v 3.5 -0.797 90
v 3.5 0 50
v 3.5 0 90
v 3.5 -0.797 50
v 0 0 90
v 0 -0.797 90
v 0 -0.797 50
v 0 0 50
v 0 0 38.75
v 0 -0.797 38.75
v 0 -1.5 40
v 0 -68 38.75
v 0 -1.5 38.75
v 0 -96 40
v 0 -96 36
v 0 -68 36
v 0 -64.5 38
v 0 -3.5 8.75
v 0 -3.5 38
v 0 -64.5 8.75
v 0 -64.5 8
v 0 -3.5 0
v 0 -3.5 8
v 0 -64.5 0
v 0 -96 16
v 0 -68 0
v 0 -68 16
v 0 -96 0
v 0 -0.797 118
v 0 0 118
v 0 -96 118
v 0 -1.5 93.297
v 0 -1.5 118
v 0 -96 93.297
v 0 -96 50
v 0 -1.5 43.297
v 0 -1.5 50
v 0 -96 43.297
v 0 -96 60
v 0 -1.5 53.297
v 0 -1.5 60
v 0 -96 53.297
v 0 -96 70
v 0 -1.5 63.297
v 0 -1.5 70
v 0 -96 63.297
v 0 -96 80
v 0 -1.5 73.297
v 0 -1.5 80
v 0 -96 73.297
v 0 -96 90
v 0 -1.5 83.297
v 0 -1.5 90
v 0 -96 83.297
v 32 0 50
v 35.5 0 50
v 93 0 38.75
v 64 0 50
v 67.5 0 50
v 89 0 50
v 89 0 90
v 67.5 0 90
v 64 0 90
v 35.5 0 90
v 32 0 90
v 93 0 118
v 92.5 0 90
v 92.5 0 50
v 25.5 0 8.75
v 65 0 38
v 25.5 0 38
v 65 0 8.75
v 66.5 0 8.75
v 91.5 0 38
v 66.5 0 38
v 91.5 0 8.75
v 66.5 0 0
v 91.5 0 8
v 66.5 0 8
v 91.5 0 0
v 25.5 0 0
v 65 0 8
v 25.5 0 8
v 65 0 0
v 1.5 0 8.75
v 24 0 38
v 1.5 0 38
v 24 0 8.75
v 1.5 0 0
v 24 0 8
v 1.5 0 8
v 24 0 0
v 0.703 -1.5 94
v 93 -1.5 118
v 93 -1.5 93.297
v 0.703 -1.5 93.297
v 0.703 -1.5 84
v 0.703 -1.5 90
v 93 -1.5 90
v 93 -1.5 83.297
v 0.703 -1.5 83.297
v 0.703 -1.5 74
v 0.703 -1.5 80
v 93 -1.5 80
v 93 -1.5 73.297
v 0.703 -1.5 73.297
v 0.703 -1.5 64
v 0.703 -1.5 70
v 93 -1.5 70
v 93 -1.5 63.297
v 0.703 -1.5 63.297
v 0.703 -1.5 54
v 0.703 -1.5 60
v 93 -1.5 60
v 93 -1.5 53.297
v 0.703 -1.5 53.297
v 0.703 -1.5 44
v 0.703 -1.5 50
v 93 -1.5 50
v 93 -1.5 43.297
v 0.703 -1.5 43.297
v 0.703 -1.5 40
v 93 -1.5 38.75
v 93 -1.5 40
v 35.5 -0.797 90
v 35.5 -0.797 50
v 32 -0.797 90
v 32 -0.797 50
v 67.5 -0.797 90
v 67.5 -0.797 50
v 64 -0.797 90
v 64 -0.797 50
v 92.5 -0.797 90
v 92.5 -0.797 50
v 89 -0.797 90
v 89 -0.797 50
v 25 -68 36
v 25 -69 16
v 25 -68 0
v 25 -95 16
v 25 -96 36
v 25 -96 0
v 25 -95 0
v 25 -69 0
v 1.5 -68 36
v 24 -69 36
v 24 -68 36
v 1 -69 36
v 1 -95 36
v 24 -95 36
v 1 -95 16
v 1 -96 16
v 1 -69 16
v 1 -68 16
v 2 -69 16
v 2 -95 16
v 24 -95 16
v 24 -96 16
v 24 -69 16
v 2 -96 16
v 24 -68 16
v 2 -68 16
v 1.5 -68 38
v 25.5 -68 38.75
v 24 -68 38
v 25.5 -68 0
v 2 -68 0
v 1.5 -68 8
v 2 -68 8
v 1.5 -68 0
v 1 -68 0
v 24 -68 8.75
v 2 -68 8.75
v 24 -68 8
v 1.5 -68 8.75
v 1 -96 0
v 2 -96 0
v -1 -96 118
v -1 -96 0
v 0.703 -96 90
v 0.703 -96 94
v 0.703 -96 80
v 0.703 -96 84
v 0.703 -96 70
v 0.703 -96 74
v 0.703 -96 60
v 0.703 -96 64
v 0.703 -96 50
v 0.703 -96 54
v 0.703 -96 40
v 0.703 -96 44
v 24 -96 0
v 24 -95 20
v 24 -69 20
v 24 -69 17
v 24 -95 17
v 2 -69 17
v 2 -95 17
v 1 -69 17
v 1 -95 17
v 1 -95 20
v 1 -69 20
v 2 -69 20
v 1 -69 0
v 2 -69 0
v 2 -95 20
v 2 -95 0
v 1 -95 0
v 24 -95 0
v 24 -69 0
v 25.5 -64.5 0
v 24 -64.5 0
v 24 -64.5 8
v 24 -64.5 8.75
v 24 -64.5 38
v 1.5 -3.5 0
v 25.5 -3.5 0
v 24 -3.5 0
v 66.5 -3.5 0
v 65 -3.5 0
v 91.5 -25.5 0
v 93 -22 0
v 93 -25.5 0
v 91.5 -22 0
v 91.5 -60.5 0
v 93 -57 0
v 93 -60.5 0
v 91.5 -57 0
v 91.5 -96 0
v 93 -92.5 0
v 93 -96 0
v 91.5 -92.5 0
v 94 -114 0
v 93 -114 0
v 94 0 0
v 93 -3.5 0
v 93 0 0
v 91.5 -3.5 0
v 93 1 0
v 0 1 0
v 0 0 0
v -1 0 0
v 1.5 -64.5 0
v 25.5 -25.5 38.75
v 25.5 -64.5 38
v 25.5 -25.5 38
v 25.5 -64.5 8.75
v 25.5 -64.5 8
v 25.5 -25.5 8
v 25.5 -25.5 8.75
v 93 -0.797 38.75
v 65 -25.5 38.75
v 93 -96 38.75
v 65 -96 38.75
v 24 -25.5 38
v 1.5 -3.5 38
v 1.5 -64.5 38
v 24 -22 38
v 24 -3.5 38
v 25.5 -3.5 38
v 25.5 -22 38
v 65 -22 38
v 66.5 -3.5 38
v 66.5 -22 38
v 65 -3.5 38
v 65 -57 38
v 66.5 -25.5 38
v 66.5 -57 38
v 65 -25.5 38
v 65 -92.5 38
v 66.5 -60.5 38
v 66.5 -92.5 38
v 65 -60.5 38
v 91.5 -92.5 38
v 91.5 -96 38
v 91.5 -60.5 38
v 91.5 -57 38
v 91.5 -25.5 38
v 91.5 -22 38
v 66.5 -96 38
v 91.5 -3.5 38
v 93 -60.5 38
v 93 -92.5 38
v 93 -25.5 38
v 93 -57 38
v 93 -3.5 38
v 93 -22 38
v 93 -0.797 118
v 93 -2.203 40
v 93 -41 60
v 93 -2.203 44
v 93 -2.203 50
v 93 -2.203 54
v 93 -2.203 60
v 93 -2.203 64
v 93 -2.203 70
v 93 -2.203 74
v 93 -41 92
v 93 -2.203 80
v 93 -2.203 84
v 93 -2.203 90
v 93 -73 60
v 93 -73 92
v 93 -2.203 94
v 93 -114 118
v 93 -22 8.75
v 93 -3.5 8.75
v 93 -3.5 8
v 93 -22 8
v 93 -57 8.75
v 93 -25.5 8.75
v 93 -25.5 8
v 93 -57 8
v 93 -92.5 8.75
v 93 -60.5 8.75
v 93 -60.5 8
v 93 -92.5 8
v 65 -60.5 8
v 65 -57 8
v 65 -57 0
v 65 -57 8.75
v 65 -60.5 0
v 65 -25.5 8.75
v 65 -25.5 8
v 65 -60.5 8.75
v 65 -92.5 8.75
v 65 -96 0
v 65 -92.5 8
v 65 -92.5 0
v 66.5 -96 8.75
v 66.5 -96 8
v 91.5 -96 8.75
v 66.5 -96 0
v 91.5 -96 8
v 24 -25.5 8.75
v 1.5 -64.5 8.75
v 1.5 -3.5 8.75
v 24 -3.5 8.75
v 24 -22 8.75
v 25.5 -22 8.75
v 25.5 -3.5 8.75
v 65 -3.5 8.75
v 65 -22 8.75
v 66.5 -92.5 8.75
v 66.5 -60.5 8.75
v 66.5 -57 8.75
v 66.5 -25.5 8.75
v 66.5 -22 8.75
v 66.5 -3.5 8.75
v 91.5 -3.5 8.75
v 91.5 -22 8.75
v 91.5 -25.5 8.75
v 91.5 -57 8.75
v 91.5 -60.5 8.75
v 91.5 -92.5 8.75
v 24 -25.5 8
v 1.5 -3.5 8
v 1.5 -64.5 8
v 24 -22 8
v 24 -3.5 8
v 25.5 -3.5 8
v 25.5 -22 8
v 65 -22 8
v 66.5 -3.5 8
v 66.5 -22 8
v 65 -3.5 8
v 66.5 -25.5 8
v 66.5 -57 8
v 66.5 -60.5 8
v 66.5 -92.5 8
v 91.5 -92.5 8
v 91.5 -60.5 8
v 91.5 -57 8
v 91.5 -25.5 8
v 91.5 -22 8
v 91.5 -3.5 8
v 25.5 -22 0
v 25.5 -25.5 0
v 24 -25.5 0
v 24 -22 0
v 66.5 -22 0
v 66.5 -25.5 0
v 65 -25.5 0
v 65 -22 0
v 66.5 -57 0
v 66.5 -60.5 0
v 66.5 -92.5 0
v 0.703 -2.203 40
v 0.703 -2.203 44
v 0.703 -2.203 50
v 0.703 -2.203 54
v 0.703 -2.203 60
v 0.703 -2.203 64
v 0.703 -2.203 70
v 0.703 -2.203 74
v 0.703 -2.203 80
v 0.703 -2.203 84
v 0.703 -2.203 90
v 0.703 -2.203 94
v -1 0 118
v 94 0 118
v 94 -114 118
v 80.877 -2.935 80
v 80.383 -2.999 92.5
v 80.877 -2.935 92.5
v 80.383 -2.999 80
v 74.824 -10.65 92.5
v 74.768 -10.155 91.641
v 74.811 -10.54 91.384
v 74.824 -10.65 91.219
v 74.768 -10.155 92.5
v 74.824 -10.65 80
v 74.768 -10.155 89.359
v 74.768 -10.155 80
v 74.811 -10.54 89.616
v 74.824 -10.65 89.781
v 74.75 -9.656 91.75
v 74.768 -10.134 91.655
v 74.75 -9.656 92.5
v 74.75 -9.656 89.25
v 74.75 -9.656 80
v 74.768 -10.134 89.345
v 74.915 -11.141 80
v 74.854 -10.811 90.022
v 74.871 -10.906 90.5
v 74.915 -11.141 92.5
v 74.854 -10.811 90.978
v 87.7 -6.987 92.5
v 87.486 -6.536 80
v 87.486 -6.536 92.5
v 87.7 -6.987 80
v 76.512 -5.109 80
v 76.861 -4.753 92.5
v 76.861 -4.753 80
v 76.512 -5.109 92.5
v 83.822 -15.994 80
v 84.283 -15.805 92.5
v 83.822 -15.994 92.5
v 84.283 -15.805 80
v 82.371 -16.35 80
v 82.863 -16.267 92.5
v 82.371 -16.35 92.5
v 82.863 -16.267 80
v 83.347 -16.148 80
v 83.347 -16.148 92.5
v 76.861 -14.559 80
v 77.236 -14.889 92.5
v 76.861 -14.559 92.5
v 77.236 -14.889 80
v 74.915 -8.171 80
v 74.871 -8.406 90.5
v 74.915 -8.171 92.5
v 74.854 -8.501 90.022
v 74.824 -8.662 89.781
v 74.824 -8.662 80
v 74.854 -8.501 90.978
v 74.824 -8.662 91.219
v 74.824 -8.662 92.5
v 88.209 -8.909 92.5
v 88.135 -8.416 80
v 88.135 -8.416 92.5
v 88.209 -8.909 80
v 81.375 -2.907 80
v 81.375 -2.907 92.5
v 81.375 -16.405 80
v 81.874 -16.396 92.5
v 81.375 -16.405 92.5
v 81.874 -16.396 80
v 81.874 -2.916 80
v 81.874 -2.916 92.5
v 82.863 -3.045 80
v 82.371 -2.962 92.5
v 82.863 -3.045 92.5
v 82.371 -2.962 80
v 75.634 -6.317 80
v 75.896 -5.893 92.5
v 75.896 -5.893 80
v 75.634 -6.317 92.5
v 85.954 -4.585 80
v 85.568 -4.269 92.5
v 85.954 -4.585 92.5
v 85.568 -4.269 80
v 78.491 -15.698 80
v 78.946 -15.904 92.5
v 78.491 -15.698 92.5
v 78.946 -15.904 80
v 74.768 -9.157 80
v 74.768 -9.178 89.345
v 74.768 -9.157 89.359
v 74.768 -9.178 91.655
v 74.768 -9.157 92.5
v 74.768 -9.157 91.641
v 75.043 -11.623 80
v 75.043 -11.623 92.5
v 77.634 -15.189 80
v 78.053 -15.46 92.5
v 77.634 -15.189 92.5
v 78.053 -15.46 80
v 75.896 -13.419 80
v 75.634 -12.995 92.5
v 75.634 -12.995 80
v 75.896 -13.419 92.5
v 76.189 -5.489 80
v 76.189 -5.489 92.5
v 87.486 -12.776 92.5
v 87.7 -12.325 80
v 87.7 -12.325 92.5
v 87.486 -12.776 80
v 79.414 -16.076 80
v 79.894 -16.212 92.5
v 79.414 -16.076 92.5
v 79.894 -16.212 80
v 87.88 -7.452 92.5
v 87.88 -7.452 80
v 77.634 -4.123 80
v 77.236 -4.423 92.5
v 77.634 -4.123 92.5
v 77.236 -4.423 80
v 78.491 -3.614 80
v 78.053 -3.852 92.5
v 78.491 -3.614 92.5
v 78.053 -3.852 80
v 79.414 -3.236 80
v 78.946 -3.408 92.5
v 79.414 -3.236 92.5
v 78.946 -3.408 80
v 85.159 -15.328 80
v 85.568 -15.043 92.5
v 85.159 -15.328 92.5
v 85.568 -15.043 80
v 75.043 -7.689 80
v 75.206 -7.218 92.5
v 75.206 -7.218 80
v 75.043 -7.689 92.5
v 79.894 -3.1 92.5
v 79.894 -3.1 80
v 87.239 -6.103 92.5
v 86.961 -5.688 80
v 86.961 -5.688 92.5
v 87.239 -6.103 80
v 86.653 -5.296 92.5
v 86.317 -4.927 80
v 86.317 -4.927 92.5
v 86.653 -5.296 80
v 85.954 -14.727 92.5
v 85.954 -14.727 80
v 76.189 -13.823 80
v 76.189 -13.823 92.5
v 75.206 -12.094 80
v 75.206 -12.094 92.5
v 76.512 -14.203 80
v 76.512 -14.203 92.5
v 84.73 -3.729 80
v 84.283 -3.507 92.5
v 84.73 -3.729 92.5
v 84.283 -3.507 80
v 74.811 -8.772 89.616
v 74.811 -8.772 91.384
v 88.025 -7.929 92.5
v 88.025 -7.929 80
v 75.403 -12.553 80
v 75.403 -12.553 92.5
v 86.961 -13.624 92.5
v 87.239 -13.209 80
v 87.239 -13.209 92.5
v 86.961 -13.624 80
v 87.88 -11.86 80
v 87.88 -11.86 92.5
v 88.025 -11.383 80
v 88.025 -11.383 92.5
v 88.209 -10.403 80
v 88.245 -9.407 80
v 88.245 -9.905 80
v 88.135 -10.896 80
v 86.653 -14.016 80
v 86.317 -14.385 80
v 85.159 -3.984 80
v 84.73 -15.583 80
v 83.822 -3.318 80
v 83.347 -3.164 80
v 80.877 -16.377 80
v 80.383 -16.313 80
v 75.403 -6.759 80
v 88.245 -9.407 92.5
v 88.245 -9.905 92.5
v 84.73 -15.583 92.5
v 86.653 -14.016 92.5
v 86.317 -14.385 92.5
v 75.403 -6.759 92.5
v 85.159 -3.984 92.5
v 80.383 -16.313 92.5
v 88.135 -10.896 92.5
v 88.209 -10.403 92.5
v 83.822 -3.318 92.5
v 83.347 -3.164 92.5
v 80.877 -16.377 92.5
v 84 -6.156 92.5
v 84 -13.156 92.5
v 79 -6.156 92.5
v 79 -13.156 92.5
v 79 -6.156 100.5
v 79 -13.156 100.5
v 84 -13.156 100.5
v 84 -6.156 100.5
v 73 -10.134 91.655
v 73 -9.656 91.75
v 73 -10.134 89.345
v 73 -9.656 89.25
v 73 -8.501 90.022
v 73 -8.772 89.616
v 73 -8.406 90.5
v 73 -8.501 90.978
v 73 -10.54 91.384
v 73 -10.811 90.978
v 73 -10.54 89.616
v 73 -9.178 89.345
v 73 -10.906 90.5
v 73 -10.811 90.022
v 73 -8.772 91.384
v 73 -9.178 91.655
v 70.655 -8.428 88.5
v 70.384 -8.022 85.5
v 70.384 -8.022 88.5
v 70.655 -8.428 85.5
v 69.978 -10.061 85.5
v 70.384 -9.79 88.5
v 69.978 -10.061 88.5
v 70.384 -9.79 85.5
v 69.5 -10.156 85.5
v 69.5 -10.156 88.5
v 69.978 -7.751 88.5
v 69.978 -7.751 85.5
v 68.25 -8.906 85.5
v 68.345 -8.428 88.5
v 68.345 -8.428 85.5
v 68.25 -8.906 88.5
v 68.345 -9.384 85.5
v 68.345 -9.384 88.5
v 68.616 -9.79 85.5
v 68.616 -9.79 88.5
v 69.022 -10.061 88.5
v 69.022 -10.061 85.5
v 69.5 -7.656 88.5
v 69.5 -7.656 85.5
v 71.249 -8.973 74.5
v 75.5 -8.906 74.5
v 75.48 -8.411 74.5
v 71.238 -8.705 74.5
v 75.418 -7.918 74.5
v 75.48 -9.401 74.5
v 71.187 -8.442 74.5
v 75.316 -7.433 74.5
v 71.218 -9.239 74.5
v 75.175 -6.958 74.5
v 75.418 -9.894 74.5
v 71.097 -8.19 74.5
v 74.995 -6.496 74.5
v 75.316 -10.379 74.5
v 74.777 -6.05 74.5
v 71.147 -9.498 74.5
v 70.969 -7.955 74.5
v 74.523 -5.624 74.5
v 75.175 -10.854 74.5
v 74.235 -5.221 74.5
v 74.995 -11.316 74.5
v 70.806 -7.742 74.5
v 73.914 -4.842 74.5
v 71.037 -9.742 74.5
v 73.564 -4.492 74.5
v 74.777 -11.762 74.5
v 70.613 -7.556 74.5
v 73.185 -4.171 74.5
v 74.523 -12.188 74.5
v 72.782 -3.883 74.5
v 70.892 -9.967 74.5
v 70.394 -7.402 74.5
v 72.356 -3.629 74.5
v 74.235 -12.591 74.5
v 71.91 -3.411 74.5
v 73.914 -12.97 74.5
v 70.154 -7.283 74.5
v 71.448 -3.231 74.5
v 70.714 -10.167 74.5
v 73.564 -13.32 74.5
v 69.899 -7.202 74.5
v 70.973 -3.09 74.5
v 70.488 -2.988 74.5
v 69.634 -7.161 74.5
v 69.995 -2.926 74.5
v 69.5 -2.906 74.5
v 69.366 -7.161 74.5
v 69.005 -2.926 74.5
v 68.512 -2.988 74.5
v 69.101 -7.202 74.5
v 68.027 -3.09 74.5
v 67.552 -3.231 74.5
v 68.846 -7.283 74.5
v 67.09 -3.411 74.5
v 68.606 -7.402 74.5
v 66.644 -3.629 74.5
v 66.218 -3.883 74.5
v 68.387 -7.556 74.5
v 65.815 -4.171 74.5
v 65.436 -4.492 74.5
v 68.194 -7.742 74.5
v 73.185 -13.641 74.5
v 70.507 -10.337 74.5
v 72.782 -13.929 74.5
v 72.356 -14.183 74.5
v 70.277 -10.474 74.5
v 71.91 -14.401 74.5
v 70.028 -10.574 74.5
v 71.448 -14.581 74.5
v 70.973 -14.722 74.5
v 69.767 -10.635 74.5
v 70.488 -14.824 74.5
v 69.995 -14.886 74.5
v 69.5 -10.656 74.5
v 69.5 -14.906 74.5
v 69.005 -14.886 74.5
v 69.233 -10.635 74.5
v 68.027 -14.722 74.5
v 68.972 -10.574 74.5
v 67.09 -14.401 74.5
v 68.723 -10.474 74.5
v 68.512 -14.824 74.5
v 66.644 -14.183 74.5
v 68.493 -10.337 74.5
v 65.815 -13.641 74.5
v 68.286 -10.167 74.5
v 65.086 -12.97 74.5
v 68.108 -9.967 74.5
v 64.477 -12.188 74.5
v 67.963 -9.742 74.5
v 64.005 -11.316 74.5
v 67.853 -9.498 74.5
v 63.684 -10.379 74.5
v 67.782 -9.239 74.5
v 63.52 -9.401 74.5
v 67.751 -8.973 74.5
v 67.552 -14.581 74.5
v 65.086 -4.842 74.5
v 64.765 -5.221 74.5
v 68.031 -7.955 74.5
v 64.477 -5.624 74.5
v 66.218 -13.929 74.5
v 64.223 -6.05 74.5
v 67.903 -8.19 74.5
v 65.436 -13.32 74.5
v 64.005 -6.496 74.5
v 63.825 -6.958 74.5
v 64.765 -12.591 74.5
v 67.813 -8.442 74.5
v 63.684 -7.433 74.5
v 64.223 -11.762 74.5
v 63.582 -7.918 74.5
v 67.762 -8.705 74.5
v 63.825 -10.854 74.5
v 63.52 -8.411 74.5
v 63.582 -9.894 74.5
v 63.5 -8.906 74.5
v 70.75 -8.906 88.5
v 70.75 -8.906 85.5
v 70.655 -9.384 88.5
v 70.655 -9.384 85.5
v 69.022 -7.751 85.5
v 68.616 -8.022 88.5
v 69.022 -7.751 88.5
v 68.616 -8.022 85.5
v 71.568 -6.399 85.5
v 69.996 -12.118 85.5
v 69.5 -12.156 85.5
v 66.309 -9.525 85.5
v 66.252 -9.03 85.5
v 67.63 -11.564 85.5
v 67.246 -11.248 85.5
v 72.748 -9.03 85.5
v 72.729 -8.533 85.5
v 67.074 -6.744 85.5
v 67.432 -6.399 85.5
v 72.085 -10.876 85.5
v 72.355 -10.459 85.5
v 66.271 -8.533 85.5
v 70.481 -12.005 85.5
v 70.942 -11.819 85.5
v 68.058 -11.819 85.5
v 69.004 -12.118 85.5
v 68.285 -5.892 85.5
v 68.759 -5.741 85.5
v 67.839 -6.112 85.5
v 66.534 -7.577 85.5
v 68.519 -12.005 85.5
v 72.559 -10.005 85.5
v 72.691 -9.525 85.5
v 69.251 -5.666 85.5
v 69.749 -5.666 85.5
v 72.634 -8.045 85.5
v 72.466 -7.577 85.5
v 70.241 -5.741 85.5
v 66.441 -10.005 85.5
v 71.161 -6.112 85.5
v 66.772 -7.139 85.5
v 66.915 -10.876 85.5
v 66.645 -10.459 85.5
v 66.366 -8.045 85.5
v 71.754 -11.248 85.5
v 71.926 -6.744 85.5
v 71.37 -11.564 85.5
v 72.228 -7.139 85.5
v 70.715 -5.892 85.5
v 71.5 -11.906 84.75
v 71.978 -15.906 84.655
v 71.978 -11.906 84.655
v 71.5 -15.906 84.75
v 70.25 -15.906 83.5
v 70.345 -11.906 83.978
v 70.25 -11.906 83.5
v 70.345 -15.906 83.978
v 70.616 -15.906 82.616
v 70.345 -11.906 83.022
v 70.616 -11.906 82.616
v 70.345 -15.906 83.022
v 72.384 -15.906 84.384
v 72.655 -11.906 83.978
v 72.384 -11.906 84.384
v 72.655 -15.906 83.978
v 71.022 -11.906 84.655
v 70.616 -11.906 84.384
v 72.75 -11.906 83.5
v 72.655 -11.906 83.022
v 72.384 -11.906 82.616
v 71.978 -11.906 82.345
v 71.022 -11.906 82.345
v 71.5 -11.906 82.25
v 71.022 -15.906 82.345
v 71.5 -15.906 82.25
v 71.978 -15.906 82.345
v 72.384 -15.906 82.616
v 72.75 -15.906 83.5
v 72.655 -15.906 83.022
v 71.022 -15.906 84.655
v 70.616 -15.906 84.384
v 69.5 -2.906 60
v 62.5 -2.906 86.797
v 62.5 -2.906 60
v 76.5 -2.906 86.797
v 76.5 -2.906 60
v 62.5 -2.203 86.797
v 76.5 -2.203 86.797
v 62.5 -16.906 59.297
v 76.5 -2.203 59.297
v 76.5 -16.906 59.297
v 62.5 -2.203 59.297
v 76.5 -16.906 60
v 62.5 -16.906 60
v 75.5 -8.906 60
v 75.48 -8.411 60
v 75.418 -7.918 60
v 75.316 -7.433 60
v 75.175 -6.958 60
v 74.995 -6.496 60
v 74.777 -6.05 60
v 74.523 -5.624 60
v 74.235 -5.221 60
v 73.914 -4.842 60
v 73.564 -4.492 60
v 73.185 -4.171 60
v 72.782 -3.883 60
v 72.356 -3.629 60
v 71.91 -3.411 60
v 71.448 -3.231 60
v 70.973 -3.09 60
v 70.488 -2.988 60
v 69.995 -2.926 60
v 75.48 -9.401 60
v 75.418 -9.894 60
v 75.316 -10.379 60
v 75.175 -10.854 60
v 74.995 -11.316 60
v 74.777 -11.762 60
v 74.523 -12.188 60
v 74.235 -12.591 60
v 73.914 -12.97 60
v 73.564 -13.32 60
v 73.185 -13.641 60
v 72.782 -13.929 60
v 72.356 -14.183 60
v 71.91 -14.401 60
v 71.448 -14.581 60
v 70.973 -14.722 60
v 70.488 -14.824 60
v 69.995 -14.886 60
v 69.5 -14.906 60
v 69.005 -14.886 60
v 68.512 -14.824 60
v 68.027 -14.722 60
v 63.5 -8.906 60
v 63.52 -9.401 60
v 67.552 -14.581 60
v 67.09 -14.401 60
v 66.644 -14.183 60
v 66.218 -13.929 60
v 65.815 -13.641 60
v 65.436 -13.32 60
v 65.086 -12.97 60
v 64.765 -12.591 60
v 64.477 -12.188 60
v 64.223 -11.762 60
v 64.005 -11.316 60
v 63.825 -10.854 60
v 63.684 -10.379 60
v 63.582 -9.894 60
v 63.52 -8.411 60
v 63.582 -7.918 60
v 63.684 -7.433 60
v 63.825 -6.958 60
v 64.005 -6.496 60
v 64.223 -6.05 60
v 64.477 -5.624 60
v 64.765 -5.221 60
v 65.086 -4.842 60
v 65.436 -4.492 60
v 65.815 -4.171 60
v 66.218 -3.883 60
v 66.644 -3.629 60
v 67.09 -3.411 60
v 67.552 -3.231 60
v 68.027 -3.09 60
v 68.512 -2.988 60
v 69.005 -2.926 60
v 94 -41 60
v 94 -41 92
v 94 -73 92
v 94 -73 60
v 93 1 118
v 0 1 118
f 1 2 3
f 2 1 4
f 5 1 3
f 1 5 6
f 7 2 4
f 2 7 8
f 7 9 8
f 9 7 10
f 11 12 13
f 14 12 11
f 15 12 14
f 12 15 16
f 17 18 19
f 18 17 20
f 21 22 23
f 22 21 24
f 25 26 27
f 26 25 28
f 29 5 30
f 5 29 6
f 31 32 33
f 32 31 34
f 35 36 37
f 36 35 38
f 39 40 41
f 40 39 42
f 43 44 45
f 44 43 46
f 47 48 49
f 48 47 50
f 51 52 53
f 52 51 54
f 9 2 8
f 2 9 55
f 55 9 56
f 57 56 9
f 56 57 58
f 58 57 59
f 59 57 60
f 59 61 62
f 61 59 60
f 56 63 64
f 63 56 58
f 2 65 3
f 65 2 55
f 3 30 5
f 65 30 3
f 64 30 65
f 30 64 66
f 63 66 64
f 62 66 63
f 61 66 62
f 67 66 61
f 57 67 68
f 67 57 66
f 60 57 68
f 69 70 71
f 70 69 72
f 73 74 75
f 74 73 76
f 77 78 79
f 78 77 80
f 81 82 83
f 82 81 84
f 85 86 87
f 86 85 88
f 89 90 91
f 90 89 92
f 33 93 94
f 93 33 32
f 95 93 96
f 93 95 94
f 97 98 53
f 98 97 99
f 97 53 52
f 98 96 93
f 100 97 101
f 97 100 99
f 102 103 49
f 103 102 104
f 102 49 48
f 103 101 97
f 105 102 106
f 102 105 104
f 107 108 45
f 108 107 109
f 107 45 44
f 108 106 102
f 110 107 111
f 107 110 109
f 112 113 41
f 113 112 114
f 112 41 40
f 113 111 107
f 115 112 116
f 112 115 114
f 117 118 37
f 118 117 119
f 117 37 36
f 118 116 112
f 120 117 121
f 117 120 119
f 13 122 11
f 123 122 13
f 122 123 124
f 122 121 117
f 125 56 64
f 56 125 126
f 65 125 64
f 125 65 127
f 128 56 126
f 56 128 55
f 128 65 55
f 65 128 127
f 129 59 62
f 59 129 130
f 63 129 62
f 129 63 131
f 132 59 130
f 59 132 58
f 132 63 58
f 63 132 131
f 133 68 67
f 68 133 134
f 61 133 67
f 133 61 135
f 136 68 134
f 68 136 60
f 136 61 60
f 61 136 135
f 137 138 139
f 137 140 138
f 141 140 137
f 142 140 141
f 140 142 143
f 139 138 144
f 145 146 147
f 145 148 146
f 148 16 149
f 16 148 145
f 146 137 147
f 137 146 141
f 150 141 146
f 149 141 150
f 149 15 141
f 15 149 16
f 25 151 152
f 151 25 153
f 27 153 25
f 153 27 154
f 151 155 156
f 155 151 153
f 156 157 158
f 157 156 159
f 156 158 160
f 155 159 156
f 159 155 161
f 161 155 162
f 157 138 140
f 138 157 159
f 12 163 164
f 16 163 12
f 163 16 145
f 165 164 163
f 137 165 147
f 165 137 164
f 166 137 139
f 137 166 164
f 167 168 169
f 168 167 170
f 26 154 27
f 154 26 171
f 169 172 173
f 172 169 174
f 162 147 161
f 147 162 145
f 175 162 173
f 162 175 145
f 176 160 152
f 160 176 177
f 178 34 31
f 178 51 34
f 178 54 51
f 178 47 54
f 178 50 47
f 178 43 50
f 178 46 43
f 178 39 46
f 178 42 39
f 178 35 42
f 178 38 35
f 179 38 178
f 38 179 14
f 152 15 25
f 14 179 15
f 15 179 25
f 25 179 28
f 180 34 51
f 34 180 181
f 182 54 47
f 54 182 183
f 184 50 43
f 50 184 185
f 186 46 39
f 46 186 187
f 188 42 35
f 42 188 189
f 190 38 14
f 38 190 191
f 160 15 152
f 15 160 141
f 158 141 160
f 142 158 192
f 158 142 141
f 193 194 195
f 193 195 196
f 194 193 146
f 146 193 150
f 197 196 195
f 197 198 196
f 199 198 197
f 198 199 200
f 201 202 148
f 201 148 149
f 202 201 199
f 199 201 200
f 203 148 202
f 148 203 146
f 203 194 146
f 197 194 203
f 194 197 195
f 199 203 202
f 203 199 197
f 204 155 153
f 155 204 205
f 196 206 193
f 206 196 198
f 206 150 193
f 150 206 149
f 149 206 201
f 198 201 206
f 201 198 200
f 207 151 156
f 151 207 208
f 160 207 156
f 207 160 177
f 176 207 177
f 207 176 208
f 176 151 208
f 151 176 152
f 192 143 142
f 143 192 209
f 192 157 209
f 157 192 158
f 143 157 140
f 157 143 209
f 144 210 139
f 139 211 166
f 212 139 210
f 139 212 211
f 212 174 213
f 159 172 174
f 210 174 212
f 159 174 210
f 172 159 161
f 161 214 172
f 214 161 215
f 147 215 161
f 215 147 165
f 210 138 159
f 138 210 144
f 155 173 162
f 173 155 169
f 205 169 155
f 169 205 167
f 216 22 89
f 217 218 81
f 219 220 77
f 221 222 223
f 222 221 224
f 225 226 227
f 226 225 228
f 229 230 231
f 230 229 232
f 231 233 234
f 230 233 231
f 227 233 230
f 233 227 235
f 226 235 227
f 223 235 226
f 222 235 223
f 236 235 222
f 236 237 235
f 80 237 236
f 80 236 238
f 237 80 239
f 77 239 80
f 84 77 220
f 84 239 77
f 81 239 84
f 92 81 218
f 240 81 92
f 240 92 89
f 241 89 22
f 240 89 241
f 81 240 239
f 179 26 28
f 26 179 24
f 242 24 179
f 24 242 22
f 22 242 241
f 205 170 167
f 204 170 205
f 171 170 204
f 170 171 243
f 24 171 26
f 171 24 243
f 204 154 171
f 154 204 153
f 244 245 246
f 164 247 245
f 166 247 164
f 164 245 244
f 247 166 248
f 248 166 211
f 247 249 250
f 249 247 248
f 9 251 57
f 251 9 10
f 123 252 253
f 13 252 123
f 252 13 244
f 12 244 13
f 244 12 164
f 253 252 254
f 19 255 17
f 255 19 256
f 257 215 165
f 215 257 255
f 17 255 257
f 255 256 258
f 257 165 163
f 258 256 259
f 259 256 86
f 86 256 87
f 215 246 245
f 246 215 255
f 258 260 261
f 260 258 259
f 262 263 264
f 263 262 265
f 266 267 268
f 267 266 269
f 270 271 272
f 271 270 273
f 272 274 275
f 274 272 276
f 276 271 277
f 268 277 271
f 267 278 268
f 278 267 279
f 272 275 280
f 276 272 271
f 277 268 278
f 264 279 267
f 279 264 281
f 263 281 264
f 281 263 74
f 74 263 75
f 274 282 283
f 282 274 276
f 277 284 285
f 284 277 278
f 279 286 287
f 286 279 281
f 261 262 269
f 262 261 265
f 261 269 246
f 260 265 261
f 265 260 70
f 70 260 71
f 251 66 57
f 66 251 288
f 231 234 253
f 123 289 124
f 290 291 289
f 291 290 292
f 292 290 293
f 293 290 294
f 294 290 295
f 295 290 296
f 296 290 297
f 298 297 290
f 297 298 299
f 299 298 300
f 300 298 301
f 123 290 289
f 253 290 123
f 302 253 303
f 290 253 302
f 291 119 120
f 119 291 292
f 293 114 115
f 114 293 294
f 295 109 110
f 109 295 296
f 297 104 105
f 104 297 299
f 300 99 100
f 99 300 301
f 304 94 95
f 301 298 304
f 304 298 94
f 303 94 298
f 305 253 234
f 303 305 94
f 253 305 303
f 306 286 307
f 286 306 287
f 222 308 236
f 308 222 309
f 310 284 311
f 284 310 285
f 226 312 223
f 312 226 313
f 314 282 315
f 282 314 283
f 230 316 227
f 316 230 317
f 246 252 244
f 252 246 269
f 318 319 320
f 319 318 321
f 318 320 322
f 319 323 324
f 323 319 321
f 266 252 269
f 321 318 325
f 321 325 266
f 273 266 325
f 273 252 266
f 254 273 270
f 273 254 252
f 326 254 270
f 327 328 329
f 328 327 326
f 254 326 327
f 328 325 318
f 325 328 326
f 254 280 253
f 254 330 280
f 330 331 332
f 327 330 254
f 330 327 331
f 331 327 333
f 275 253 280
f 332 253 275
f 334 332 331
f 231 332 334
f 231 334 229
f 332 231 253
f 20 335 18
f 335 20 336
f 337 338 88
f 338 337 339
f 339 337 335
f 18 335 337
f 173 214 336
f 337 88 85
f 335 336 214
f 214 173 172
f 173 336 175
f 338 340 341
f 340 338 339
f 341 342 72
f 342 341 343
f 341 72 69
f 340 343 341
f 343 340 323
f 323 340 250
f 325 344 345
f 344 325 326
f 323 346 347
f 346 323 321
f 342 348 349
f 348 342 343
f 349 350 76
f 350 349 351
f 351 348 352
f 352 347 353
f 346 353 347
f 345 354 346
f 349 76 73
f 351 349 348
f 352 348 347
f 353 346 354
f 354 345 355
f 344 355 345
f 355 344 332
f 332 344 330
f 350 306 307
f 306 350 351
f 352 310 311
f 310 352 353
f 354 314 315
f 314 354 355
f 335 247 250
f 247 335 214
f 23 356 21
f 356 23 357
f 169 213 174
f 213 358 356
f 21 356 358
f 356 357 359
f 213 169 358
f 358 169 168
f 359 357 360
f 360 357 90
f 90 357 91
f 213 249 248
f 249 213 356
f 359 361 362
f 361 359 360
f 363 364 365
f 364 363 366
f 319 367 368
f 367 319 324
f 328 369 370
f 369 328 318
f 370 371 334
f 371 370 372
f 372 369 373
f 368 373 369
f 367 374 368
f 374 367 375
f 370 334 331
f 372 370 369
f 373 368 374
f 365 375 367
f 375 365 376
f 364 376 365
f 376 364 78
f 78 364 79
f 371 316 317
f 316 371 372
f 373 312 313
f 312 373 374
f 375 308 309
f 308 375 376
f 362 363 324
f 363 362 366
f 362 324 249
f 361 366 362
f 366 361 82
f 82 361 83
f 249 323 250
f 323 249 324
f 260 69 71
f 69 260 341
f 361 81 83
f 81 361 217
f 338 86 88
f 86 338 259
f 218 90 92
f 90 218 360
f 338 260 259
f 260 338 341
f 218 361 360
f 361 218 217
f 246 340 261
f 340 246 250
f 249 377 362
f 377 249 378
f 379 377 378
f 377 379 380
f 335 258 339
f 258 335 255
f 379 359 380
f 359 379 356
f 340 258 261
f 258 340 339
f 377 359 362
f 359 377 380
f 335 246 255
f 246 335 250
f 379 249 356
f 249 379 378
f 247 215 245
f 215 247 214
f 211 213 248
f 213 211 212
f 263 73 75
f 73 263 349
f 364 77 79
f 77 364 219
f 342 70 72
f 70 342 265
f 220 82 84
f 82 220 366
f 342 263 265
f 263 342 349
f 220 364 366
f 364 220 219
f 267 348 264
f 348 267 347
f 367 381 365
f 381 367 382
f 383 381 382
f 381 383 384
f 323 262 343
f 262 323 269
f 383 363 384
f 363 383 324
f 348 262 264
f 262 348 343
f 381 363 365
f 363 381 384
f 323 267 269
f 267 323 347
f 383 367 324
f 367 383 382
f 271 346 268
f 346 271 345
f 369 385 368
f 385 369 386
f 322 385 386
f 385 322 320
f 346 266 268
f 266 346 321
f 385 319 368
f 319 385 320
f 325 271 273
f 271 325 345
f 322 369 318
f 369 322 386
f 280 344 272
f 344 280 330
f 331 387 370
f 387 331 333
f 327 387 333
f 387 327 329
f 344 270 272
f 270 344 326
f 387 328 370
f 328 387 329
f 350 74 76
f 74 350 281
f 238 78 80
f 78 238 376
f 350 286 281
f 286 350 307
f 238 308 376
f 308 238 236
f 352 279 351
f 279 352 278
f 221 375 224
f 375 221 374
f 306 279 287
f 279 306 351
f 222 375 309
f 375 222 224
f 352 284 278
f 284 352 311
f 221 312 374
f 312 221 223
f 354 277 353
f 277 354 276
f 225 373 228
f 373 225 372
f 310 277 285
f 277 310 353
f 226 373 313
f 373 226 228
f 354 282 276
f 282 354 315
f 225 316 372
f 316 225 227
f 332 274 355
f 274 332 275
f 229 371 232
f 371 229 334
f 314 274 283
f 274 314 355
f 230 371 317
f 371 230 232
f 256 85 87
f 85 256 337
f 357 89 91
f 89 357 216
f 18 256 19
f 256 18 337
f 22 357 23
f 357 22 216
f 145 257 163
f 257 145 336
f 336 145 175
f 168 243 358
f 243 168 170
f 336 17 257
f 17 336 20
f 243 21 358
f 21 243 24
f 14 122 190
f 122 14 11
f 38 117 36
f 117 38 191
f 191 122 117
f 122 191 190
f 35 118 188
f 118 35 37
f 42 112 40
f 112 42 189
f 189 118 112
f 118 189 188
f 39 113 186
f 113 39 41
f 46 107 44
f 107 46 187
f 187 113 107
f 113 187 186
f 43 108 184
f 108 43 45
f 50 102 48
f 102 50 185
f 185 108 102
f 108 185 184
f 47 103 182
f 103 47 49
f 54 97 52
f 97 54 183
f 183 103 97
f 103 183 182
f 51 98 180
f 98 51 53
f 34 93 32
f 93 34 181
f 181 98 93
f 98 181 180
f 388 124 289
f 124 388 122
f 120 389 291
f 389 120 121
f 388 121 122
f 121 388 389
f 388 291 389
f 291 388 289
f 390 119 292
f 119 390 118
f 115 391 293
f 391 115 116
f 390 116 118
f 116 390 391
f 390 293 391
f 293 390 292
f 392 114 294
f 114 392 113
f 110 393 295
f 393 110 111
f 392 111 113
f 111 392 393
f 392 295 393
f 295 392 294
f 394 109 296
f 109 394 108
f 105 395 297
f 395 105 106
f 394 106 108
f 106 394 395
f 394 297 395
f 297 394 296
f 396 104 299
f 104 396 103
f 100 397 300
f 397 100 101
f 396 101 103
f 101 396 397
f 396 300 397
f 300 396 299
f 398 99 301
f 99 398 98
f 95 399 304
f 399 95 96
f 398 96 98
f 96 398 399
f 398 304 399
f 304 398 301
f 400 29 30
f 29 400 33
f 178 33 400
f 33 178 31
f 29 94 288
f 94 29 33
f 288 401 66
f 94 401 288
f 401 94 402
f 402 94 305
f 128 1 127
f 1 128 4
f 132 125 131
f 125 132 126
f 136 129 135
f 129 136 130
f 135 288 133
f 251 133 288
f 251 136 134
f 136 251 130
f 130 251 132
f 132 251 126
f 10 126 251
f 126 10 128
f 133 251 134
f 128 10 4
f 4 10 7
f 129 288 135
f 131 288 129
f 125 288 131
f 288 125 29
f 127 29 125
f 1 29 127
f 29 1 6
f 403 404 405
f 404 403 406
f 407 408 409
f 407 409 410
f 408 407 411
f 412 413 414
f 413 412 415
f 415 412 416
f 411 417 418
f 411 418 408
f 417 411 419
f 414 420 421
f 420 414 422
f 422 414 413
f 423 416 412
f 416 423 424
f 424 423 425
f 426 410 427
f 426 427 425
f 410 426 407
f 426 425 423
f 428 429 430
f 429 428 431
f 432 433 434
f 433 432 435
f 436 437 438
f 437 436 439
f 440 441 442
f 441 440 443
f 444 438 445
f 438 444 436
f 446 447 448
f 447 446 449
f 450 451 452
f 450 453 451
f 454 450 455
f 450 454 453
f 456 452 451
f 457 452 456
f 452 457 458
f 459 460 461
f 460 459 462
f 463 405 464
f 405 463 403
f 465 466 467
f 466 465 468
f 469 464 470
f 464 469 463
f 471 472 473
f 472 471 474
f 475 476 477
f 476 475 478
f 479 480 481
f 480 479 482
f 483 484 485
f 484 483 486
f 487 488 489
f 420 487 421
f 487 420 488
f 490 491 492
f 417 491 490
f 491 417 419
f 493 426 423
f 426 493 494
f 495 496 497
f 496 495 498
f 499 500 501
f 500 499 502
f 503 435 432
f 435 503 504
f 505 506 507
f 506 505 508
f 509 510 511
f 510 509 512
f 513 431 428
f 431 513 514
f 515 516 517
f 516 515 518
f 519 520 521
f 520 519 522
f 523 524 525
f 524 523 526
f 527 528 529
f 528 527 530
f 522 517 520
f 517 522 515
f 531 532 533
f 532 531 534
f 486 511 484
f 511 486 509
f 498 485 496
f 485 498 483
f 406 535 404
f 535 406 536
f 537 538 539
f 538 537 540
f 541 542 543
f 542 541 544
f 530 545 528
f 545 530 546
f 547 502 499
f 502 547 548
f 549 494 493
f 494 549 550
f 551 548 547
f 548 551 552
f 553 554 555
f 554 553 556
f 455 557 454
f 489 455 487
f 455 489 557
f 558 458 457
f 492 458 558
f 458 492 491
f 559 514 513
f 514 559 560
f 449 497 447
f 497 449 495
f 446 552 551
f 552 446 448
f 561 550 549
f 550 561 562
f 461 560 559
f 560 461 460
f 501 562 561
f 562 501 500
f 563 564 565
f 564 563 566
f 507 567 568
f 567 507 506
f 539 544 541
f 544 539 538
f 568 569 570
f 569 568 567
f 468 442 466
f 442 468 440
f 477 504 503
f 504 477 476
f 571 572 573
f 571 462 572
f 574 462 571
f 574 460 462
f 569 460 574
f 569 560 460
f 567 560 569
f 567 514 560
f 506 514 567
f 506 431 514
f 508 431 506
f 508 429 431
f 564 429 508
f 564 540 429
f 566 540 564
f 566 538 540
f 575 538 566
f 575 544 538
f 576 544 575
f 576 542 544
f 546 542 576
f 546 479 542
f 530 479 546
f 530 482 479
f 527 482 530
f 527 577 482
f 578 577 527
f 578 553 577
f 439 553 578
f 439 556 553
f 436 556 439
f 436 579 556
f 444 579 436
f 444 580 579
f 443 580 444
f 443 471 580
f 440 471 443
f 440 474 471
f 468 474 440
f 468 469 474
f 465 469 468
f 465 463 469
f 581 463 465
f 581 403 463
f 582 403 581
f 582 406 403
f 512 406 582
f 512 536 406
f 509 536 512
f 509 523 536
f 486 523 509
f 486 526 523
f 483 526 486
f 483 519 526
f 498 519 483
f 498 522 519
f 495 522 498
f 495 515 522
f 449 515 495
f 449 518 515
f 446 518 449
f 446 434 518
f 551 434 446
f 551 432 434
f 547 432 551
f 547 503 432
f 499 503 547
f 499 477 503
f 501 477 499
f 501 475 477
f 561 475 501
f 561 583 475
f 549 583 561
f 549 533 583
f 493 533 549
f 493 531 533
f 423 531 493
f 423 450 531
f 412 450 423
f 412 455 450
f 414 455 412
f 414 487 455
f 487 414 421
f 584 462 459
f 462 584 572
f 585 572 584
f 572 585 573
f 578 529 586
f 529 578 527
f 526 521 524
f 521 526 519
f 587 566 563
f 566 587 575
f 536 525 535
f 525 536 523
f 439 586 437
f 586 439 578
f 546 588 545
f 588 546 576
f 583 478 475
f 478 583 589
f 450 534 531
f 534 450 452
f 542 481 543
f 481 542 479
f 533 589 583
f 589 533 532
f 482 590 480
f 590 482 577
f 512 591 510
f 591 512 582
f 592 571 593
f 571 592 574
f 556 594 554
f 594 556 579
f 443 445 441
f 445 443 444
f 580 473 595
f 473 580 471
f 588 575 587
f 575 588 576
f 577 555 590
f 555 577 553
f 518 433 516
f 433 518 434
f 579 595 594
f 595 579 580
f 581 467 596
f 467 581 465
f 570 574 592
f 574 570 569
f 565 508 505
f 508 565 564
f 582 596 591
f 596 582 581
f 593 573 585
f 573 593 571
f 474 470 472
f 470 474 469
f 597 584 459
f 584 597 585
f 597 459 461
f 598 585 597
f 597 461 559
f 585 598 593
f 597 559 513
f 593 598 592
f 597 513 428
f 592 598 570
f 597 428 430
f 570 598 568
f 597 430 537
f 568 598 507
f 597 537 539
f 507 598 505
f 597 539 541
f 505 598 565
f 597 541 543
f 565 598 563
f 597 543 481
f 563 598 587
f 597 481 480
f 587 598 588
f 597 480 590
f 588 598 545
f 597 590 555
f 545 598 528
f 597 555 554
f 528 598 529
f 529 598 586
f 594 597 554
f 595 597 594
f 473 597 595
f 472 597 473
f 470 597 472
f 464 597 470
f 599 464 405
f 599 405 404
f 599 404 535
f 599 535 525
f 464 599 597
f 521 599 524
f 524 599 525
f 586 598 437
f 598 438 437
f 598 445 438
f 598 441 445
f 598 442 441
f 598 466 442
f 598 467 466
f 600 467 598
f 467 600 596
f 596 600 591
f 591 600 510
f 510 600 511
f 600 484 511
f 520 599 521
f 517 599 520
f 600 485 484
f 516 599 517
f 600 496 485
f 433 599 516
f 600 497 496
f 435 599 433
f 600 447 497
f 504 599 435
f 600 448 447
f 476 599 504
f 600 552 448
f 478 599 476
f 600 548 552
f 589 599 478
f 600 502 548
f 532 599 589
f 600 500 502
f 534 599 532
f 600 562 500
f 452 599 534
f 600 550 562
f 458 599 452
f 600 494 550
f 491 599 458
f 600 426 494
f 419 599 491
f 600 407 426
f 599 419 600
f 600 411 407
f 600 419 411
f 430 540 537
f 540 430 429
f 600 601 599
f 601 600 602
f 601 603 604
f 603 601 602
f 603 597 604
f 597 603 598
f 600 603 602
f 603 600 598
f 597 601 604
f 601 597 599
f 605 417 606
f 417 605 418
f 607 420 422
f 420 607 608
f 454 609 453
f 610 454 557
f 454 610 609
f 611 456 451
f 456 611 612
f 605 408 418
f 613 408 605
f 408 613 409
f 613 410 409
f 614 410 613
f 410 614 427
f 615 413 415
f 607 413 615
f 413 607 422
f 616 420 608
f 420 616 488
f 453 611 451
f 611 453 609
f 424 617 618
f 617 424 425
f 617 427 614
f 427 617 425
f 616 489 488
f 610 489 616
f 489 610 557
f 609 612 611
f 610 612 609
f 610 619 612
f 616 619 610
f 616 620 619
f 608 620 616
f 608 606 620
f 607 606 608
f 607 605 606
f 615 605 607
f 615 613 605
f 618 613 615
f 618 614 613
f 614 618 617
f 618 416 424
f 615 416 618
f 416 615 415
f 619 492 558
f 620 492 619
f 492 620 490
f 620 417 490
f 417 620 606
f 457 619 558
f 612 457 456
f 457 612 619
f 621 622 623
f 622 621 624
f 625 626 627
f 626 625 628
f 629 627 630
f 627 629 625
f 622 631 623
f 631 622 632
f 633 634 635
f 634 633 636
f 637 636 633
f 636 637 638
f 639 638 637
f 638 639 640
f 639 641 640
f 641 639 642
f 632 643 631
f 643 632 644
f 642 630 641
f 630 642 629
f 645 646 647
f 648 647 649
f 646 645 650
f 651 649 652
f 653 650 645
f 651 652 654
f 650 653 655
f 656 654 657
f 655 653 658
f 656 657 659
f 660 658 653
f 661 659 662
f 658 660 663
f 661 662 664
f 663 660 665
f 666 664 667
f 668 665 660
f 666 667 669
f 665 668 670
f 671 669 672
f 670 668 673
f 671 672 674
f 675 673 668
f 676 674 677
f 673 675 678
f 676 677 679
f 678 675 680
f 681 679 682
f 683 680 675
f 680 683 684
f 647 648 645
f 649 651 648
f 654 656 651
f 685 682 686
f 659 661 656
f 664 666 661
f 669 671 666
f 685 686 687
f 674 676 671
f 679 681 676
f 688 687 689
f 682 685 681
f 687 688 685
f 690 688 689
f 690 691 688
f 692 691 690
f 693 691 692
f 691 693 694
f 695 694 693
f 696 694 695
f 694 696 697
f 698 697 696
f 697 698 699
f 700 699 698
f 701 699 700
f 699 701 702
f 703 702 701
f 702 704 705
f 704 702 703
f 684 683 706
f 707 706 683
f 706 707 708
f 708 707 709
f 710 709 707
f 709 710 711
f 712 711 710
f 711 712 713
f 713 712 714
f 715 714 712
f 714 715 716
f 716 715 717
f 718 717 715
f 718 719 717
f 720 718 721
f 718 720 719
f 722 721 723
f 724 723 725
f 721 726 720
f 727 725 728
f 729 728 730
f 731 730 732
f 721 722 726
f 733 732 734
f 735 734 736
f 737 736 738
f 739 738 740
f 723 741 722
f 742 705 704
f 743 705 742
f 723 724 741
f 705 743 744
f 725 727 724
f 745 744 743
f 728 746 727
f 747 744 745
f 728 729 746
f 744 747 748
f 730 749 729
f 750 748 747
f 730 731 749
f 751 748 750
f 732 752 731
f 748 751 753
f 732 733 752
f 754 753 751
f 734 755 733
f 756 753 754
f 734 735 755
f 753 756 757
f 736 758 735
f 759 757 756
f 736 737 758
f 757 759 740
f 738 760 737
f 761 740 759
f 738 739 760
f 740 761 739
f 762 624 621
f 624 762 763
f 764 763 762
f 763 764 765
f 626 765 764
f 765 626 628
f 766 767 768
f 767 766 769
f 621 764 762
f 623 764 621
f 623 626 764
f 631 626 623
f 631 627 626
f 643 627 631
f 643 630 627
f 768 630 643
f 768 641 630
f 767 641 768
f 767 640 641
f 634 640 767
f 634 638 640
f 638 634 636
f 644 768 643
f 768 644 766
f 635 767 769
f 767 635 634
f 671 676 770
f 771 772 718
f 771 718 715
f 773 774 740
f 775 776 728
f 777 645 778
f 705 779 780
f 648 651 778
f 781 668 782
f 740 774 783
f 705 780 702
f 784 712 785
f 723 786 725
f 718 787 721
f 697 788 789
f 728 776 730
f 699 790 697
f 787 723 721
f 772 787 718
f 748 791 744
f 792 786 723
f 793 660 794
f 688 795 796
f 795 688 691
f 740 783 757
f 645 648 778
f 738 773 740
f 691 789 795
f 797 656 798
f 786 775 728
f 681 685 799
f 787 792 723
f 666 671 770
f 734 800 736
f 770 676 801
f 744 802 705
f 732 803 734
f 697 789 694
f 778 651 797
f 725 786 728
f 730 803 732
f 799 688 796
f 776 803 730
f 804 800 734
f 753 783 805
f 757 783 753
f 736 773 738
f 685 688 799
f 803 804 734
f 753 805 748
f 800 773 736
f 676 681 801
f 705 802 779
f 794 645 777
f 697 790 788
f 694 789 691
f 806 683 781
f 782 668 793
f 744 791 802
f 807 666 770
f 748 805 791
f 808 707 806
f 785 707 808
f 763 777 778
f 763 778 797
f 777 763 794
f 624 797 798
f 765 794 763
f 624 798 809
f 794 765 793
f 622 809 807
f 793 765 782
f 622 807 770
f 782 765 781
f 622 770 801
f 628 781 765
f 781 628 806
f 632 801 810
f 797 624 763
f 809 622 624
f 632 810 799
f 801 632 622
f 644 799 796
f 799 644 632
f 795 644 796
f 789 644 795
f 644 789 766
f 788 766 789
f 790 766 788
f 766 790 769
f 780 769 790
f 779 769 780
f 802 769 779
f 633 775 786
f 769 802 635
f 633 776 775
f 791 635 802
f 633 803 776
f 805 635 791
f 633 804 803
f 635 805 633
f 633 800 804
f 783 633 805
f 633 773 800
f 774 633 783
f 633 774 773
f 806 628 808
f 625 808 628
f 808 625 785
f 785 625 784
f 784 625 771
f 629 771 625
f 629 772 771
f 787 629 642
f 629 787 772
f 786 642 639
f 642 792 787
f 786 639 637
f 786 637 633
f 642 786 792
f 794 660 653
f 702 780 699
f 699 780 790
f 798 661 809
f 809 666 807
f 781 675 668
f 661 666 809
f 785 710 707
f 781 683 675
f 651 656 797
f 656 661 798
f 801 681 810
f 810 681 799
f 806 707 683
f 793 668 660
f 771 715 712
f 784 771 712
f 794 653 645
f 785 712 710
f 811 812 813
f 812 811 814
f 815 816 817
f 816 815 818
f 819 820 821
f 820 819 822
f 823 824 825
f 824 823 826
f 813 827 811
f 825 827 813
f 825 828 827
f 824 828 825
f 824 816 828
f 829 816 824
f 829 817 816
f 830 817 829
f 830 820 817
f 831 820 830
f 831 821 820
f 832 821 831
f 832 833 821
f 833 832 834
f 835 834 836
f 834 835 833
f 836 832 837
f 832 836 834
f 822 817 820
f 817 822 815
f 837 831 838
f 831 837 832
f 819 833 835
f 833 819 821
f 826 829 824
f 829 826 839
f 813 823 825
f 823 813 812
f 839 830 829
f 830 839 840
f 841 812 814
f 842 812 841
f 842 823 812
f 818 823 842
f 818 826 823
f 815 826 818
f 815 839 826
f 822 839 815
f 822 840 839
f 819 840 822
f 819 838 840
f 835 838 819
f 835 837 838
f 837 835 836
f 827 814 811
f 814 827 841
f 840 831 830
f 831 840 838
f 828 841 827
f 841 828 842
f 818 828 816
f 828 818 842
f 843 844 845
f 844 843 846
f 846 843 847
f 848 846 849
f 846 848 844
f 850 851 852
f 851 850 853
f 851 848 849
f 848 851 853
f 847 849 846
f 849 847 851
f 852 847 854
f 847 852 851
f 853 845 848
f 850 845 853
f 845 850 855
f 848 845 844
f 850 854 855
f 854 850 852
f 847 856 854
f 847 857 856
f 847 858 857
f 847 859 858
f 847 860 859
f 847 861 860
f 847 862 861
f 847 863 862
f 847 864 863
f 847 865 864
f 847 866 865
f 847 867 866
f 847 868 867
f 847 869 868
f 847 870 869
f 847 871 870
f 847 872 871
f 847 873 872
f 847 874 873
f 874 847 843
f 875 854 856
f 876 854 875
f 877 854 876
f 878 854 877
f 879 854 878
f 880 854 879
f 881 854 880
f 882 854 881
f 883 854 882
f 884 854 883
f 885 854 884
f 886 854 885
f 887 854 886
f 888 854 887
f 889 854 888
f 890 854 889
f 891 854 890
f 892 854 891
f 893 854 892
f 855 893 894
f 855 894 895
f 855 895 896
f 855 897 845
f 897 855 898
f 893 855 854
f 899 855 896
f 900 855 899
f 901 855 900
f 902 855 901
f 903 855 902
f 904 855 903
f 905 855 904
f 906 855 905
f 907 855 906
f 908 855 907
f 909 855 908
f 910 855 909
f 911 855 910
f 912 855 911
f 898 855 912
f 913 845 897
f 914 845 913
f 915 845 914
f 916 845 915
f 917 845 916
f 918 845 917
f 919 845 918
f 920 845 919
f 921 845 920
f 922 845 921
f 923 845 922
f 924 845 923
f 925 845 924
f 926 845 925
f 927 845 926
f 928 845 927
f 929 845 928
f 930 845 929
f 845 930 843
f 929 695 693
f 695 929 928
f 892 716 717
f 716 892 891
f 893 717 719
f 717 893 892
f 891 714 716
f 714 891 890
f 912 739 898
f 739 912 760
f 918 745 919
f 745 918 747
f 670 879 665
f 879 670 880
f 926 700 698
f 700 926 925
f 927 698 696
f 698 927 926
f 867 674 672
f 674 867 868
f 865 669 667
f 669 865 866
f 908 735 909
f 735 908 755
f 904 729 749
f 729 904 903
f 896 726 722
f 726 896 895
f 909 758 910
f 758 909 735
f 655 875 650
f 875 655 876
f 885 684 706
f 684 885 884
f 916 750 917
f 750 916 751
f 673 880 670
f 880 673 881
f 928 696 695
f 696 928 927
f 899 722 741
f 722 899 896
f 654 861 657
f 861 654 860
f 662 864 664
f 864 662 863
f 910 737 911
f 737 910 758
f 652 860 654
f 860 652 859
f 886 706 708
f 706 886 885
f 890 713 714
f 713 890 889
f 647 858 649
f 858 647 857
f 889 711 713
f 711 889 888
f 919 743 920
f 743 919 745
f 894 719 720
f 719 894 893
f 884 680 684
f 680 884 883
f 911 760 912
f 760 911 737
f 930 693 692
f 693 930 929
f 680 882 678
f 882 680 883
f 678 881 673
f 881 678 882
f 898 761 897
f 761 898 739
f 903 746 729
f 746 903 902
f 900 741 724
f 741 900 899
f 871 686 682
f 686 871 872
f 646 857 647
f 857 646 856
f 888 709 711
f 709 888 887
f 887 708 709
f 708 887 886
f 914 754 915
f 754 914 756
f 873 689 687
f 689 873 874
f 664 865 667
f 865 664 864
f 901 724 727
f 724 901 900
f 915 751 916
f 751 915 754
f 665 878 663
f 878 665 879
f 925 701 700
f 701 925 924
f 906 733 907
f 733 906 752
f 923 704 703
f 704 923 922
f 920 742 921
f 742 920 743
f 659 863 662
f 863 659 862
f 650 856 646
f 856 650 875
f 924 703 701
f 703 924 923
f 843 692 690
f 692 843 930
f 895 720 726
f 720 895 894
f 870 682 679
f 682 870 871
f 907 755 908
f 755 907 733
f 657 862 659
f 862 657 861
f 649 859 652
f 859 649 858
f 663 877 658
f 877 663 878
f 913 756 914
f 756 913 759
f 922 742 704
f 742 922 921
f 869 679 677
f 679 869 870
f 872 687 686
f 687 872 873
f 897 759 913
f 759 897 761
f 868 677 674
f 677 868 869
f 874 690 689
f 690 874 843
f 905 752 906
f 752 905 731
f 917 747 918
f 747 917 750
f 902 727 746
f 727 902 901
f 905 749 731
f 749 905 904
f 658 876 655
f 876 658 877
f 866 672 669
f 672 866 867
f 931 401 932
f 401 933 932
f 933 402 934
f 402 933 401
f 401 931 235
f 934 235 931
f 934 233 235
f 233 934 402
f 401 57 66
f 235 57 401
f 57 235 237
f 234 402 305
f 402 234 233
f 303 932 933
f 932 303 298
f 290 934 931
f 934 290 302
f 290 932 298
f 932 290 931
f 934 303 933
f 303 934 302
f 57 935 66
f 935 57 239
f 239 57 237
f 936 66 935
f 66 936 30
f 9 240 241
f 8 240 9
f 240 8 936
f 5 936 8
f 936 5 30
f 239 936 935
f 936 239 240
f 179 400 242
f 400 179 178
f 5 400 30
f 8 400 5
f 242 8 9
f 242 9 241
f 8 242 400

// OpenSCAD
// file: dimensions.scad
// Material Thicknesses
twoBy = 1.5;
fourBy = 3.5;
thinPlywood = 5/25.4;  // 5mm 
plywood = 0.703;  // actual for 3/4 cabinet grade

// Get walls defined
leftWall = 96;
backWall = 93;
rightWall = 114; 
wallHeight = 37+81; 
wallDepth = 1; // visual only
windowWidth = 35; 
windowHeight = 36.5; 
windowOffsetLeft = 37;
windowOffsetBottom = 37+13.125;
windowFrameWidth = 4.25;
windowFrameHeight = 4.25;
windowFrameDepth = .5;

// workbench
leftLength = 69;
rightLength = 96;
bottomShelf=9;
topShelf=37;

// studs
studHeight= 0; // 14 from top of wall, 18.5 from bench
studOneLeft=32;
studTwoLeft=55;
studThreeLeft=55+22;

// outlet drywall
// offset left: 61
// offset bottom 7

//outlet block wall
outletOffsetLeft=18;
outletOffsetBottom=8; // from workbench
// two gang box? 4.5x4.5
// depth 2.5


sinkHeight=33.5;
sinkDepth=24;
sinkWidth=20;
sinkOffsetLeft=8; // from corner to edge of sink


// French Cleat Design
cleatHeight = 4;  // TODO
cleatThickness = plywood;  // TODO

// Workbench
existingHeight = 38; // TODO
// main file
// Workshop Design Experiments
// 8' x 8' wood shop with existing utility sink

include <dimensions.scad>

echo("Material", "Part", "Width", "Height", "Z");

studs();
sink();
existingWorkbench();
frenchCleat();
dustCollection();
//tableSaw();
walls();

module tableSaw() {
    color("blue") 
    translate([20,-140,0])
    cube([46,31,38]);
}
module dustCollection() {
    // TODO add cleats
    // TODO bucket support
    // TODO side supports
    // TODO measurements
    // TODO actual vacuum
     vacHeight = 20.5; //with legs 23 without legs 20.5
     vacRadius = 13.5/2; // handles: 15/2
     vacBucketHeight = 12.5; // with legs: 15, without 12.5
     vacSquareWidth = 5; // 5x7
     vacSquareDepth = 7;
     vacHoseHeight = 10.5; // 13/ 10.5 to floor bottom of 2.5" hose 
     vacHoseRad = 1.25;
    color("blue") {
    bucketRadius = 6; // 6.25 at ridge
    bucketHeight = 14.5;
    
    deputyRadTop = 6.5/2; // TODO
    deputyRadBottom = 3.5/2; // TODO
    deputyHeight = 11; // TODO
    deputyHoseTop = 2.5;
    deputyPipeRad = 1.25; // TODO
    
    $fa = .5;
    $fs = .5;
    
    translate([backWall-bucketRadius-2*vacRadius-4,-bucketRadius-twoBy-2*plywood,60])
    rotate([0,0,-90]) {
        // Back Piece
        translate([-bucketRadius-plywood,-bucketRadius-1,-plywood])
        plywood(plywood, bucketRadius*2+2, bucketHeight+deputyHeight+2);
        // Bottom Piece
        translate([-bucketRadius,-bucketRadius-1,-plywood])
        plywood(bucketRadius*2+2,bucketRadius*2+2,plywood);
        // TODO side Left
        // TODO side right
        // TODO vaccuum bottom
        // TODO vaccuum back
//         translate([-bucketRadius, 0, vacHeight])
 //       plywood(plywood, vacRadius*2+2, vacHeight);
            
        
        // Vaccuum
        translate([vacRadius-bucketRadius, deputyRadTop + vacRadius+2, bucketHeight+deputyHeight+2*deputyHoseTop-vacHoseHeight]) rotate([0,0,-90]) {
        cylinder(vacBucketHeight, vacRadius, vacRadius);
        translate([-vacSquareWidth/2,-vacSquareDepth/2,vacBucketHeight]) cube([vacSquareWidth, vacSquareDepth, vacHeight - vacBucketHeight]);
        translate([bucketRadius,0,10.5]) rotate([0,90,0]) cylinder(deputyHoseTop, deputyPipeRad, deputyPipeRad);
        }
        // temp move
        // Bucket
        cylinder(bucketHeight,bucketRadius,bucketRadius);
        
        // Deputy
        translate([0,0,bucketHeight]) {
            cylinder(deputyHeight+3,deputyPipeRad,deputyPipeRad);
            cylinder(deputyHeight,deputyRadBottom,deputyRadTop);
            translate([3,2,deputyHeight-2])
            rotate([0,90,0])
            cylinder(4,deputyPipeRad,deputyPipeRad);
        }
   }
  
    }
    
}

module frenchCleat() {
    initialCleatHeight = 40;
    cleatSpacing = 6;
    
    // Left wall
    color("red") {
        translate([0,0,initialCleatHeight]) {
            rotate([0,0,270]) {
                translate([(twoBy), 0, 0]) cleat(leftWall-(twoBy), cleatHeight, cleatThickness);
                translate([(twoBy),0, 1*(cleatHeight + cleatSpacing)]) cleat(leftWall-(twoBy), cleatHeight, cleatThickness);
                translate([(twoBy),0, 2*(cleatHeight + cleatSpacing)]) cleat(leftWall-(twoBy), cleatHeight, cleatThickness);
                translate([(twoBy),0, 3*(cleatHeight + cleatSpacing)]) cleat(leftWall-(twoBy), cleatHeight, cleatThickness);
                translate([(twoBy),0, 4*(cleatHeight + cleatSpacing)]) cleat(leftWall-(twoBy), cleatHeight, cleatThickness);
                translate([(twoBy),0, 5*(cleatHeight + cleatSpacing)]) cleat(leftWall-(twoBy), cleatHeight, cleatThickness);
            }
        }
    }
    
    // Back wall
    translate([0,-1*twoBy,existingHeight])
    plywood(backWall, plywood, wallHeight-existingHeight);
    color("red") {
        translate([backWall, -1*(twoBy),initialCleatHeight]) {
            rotate([0,0,180]) {
                cleat(backWall-plywood, cleatHeight, cleatThickness);
                translate([0,0, 1*(cleatHeight + cleatSpacing)]) cleat(backWall-plywood, cleatHeight, cleatThickness);
                translate([0,0, 2*(cleatHeight + cleatSpacing)]) cleat(backWall-plywood, cleatHeight, cleatThickness);
                translate([0,0, 3*(cleatHeight + cleatSpacing)]) cleat(backWall-plywood, cleatHeight, cleatThickness);
                translate([0,0, 4*(cleatHeight + cleatSpacing)]) cleat(backWall-plywood, cleatHeight, cleatThickness);
                translate([0,0, 5*(cleatHeight + cleatSpacing)]) cleat(backWall-plywood, cleatHeight, cleatThickness);
            }
        }
    }
}

module cleat(w,h,t){
    // Lifted from: https://en.wikibooks.org/wiki/OpenSCAD_User_Manual/Primitive_Solids
    cleatFaces=[
        [0,1,2,3],  // bottom
        [4,5,1,0],  // front
        [7,6,5,4],  // top
        [5,6,2,1],  // right
        [6,7,3,2],  // back
        [7,4,0,3]]; // left
    
    cleatPoints=[
        // Bottom Four
        [0,0,0], 
        [w,0,0], 
        [w,t,0],
        [0,t,0],
        [0,0,h-t],
        [w,0,h-t],
        [w,t,h],
        [0,t,h]];
    polyhedron(cleatPoints, cleatFaces);
    echo("Plywood", "cleat", w, h);
}

module plywood(l,w,h) {
    cube([l,w,h]);
    echo("Plywood", "cut", l,w,h);
}

module existingWorkbench() {
    color("khaki") {

        translate([0,0,existingHeight]) {
            //left
            translate([0,-68,0])
            cube([25.5,68,.75]);
            //back
            translate([0,-25.5,0])
            cube([93,25.5,.75]);
            //right
            translate([65,-96,0])
            cube([28,96,.75]);
        }

        translate([0,0,8]) {
            //left
            translate([0,-68,0])
            cube([25.5,68,.75]);
            //back
            translate([0,-25.5,0])
            cube([93,25.5,.75]);
            //right
            translate([65,-96,0])
            cube([28,96,.75]);
        }


        // Left legs
        translate([0,-3.5,0])
        cube([1.5,3.5,existingHeight]);
        translate([0,-68,0])
        cube([1.5,3.5,existingHeight]);
        // Second Row
        translate([24,0,0]) {
            translate([0,-3.5,0])
            cube([1.5,3.5,existingHeight]);
            translate([0,-25.5,0])
            cube([1.5,3.5,existingHeight]);
            translate([0,-68,0])
            cube([1.5,3.5,existingHeight]);
        }
        // Third Row
        translate([65,0,0]) {
            translate([0,-3.5,0])
            cube([1.5,3.5,existingHeight]);
            translate([0,-25.5,0])
            cube([1.5,3.5,existingHeight]);
            translate([0,-60.5,0])
            cube([1.5,3.5,existingHeight]);
            translate([0,-96,0])
            cube([1.5,3.5,existingHeight]);
        }
        // Fourth Row
        translate([backWall-1.5,0,0]) {
            translate([0,-3.5,0])
            cube([1.5,3.5,existingHeight]);
            translate([0,-25.5,0])
            cube([1.5,3.5,existingHeight]);
            translate([0,-60.5,0])
            cube([1.5,3.5,existingHeight]);
            translate([0,-96,0])
            cube([1.5,3.5,existingHeight]);
        }
    }
}


module walls() {

        // Walls
        // Block Walls
    color("DarkSlateGray",0.25) {
        //back wall
        cube([backWall,wallDepth,wallHeight]);
        // window wall
        difference() {
            translate([backWall,-rightWall,0]) cube([wallDepth,rightWall,wallHeight]);
            translate([backWall-1,-rightWall/2-16,60]) cube([wallDepth*2+1,32,32]);
        }
    }
        // Drywall Wall
        color("white", 0.25) {
        translate([-wallDepth,-leftWall,0]) cube([wallDepth,leftWall,wallHeight]);
    }

}

module sink() {
    color("Gainsboro") 
    translate([0,-96, 16]) {
        difference(){
            cube([25,28,20]);
            translate([1,1,1]) cube([23,26,20]);
        }
    }
    color("Gainsboro") 
    translate([0,-96,0]){
        translate([1,0,0]) cube([1,1,20]);
        translate([24,0,0]) cube([1,1,20]);
        translate([24,27,0]) cube([1,1,20]);
        translate([1,27,0]) cube([1,1,20]);
       
    }
}

module studs() {
    // TODO measure
    translate([0,-1.5,50]){
        translate([0,0,0])cube([3.5,1.5,40]);
        translate([32,0,0])cube([3.5,1.5,40]);
        translate([64,0,0])cube([3.5,1.5,40]);
        translate([89,0,0])cube([3.5,1.5,40]);


    }
}
